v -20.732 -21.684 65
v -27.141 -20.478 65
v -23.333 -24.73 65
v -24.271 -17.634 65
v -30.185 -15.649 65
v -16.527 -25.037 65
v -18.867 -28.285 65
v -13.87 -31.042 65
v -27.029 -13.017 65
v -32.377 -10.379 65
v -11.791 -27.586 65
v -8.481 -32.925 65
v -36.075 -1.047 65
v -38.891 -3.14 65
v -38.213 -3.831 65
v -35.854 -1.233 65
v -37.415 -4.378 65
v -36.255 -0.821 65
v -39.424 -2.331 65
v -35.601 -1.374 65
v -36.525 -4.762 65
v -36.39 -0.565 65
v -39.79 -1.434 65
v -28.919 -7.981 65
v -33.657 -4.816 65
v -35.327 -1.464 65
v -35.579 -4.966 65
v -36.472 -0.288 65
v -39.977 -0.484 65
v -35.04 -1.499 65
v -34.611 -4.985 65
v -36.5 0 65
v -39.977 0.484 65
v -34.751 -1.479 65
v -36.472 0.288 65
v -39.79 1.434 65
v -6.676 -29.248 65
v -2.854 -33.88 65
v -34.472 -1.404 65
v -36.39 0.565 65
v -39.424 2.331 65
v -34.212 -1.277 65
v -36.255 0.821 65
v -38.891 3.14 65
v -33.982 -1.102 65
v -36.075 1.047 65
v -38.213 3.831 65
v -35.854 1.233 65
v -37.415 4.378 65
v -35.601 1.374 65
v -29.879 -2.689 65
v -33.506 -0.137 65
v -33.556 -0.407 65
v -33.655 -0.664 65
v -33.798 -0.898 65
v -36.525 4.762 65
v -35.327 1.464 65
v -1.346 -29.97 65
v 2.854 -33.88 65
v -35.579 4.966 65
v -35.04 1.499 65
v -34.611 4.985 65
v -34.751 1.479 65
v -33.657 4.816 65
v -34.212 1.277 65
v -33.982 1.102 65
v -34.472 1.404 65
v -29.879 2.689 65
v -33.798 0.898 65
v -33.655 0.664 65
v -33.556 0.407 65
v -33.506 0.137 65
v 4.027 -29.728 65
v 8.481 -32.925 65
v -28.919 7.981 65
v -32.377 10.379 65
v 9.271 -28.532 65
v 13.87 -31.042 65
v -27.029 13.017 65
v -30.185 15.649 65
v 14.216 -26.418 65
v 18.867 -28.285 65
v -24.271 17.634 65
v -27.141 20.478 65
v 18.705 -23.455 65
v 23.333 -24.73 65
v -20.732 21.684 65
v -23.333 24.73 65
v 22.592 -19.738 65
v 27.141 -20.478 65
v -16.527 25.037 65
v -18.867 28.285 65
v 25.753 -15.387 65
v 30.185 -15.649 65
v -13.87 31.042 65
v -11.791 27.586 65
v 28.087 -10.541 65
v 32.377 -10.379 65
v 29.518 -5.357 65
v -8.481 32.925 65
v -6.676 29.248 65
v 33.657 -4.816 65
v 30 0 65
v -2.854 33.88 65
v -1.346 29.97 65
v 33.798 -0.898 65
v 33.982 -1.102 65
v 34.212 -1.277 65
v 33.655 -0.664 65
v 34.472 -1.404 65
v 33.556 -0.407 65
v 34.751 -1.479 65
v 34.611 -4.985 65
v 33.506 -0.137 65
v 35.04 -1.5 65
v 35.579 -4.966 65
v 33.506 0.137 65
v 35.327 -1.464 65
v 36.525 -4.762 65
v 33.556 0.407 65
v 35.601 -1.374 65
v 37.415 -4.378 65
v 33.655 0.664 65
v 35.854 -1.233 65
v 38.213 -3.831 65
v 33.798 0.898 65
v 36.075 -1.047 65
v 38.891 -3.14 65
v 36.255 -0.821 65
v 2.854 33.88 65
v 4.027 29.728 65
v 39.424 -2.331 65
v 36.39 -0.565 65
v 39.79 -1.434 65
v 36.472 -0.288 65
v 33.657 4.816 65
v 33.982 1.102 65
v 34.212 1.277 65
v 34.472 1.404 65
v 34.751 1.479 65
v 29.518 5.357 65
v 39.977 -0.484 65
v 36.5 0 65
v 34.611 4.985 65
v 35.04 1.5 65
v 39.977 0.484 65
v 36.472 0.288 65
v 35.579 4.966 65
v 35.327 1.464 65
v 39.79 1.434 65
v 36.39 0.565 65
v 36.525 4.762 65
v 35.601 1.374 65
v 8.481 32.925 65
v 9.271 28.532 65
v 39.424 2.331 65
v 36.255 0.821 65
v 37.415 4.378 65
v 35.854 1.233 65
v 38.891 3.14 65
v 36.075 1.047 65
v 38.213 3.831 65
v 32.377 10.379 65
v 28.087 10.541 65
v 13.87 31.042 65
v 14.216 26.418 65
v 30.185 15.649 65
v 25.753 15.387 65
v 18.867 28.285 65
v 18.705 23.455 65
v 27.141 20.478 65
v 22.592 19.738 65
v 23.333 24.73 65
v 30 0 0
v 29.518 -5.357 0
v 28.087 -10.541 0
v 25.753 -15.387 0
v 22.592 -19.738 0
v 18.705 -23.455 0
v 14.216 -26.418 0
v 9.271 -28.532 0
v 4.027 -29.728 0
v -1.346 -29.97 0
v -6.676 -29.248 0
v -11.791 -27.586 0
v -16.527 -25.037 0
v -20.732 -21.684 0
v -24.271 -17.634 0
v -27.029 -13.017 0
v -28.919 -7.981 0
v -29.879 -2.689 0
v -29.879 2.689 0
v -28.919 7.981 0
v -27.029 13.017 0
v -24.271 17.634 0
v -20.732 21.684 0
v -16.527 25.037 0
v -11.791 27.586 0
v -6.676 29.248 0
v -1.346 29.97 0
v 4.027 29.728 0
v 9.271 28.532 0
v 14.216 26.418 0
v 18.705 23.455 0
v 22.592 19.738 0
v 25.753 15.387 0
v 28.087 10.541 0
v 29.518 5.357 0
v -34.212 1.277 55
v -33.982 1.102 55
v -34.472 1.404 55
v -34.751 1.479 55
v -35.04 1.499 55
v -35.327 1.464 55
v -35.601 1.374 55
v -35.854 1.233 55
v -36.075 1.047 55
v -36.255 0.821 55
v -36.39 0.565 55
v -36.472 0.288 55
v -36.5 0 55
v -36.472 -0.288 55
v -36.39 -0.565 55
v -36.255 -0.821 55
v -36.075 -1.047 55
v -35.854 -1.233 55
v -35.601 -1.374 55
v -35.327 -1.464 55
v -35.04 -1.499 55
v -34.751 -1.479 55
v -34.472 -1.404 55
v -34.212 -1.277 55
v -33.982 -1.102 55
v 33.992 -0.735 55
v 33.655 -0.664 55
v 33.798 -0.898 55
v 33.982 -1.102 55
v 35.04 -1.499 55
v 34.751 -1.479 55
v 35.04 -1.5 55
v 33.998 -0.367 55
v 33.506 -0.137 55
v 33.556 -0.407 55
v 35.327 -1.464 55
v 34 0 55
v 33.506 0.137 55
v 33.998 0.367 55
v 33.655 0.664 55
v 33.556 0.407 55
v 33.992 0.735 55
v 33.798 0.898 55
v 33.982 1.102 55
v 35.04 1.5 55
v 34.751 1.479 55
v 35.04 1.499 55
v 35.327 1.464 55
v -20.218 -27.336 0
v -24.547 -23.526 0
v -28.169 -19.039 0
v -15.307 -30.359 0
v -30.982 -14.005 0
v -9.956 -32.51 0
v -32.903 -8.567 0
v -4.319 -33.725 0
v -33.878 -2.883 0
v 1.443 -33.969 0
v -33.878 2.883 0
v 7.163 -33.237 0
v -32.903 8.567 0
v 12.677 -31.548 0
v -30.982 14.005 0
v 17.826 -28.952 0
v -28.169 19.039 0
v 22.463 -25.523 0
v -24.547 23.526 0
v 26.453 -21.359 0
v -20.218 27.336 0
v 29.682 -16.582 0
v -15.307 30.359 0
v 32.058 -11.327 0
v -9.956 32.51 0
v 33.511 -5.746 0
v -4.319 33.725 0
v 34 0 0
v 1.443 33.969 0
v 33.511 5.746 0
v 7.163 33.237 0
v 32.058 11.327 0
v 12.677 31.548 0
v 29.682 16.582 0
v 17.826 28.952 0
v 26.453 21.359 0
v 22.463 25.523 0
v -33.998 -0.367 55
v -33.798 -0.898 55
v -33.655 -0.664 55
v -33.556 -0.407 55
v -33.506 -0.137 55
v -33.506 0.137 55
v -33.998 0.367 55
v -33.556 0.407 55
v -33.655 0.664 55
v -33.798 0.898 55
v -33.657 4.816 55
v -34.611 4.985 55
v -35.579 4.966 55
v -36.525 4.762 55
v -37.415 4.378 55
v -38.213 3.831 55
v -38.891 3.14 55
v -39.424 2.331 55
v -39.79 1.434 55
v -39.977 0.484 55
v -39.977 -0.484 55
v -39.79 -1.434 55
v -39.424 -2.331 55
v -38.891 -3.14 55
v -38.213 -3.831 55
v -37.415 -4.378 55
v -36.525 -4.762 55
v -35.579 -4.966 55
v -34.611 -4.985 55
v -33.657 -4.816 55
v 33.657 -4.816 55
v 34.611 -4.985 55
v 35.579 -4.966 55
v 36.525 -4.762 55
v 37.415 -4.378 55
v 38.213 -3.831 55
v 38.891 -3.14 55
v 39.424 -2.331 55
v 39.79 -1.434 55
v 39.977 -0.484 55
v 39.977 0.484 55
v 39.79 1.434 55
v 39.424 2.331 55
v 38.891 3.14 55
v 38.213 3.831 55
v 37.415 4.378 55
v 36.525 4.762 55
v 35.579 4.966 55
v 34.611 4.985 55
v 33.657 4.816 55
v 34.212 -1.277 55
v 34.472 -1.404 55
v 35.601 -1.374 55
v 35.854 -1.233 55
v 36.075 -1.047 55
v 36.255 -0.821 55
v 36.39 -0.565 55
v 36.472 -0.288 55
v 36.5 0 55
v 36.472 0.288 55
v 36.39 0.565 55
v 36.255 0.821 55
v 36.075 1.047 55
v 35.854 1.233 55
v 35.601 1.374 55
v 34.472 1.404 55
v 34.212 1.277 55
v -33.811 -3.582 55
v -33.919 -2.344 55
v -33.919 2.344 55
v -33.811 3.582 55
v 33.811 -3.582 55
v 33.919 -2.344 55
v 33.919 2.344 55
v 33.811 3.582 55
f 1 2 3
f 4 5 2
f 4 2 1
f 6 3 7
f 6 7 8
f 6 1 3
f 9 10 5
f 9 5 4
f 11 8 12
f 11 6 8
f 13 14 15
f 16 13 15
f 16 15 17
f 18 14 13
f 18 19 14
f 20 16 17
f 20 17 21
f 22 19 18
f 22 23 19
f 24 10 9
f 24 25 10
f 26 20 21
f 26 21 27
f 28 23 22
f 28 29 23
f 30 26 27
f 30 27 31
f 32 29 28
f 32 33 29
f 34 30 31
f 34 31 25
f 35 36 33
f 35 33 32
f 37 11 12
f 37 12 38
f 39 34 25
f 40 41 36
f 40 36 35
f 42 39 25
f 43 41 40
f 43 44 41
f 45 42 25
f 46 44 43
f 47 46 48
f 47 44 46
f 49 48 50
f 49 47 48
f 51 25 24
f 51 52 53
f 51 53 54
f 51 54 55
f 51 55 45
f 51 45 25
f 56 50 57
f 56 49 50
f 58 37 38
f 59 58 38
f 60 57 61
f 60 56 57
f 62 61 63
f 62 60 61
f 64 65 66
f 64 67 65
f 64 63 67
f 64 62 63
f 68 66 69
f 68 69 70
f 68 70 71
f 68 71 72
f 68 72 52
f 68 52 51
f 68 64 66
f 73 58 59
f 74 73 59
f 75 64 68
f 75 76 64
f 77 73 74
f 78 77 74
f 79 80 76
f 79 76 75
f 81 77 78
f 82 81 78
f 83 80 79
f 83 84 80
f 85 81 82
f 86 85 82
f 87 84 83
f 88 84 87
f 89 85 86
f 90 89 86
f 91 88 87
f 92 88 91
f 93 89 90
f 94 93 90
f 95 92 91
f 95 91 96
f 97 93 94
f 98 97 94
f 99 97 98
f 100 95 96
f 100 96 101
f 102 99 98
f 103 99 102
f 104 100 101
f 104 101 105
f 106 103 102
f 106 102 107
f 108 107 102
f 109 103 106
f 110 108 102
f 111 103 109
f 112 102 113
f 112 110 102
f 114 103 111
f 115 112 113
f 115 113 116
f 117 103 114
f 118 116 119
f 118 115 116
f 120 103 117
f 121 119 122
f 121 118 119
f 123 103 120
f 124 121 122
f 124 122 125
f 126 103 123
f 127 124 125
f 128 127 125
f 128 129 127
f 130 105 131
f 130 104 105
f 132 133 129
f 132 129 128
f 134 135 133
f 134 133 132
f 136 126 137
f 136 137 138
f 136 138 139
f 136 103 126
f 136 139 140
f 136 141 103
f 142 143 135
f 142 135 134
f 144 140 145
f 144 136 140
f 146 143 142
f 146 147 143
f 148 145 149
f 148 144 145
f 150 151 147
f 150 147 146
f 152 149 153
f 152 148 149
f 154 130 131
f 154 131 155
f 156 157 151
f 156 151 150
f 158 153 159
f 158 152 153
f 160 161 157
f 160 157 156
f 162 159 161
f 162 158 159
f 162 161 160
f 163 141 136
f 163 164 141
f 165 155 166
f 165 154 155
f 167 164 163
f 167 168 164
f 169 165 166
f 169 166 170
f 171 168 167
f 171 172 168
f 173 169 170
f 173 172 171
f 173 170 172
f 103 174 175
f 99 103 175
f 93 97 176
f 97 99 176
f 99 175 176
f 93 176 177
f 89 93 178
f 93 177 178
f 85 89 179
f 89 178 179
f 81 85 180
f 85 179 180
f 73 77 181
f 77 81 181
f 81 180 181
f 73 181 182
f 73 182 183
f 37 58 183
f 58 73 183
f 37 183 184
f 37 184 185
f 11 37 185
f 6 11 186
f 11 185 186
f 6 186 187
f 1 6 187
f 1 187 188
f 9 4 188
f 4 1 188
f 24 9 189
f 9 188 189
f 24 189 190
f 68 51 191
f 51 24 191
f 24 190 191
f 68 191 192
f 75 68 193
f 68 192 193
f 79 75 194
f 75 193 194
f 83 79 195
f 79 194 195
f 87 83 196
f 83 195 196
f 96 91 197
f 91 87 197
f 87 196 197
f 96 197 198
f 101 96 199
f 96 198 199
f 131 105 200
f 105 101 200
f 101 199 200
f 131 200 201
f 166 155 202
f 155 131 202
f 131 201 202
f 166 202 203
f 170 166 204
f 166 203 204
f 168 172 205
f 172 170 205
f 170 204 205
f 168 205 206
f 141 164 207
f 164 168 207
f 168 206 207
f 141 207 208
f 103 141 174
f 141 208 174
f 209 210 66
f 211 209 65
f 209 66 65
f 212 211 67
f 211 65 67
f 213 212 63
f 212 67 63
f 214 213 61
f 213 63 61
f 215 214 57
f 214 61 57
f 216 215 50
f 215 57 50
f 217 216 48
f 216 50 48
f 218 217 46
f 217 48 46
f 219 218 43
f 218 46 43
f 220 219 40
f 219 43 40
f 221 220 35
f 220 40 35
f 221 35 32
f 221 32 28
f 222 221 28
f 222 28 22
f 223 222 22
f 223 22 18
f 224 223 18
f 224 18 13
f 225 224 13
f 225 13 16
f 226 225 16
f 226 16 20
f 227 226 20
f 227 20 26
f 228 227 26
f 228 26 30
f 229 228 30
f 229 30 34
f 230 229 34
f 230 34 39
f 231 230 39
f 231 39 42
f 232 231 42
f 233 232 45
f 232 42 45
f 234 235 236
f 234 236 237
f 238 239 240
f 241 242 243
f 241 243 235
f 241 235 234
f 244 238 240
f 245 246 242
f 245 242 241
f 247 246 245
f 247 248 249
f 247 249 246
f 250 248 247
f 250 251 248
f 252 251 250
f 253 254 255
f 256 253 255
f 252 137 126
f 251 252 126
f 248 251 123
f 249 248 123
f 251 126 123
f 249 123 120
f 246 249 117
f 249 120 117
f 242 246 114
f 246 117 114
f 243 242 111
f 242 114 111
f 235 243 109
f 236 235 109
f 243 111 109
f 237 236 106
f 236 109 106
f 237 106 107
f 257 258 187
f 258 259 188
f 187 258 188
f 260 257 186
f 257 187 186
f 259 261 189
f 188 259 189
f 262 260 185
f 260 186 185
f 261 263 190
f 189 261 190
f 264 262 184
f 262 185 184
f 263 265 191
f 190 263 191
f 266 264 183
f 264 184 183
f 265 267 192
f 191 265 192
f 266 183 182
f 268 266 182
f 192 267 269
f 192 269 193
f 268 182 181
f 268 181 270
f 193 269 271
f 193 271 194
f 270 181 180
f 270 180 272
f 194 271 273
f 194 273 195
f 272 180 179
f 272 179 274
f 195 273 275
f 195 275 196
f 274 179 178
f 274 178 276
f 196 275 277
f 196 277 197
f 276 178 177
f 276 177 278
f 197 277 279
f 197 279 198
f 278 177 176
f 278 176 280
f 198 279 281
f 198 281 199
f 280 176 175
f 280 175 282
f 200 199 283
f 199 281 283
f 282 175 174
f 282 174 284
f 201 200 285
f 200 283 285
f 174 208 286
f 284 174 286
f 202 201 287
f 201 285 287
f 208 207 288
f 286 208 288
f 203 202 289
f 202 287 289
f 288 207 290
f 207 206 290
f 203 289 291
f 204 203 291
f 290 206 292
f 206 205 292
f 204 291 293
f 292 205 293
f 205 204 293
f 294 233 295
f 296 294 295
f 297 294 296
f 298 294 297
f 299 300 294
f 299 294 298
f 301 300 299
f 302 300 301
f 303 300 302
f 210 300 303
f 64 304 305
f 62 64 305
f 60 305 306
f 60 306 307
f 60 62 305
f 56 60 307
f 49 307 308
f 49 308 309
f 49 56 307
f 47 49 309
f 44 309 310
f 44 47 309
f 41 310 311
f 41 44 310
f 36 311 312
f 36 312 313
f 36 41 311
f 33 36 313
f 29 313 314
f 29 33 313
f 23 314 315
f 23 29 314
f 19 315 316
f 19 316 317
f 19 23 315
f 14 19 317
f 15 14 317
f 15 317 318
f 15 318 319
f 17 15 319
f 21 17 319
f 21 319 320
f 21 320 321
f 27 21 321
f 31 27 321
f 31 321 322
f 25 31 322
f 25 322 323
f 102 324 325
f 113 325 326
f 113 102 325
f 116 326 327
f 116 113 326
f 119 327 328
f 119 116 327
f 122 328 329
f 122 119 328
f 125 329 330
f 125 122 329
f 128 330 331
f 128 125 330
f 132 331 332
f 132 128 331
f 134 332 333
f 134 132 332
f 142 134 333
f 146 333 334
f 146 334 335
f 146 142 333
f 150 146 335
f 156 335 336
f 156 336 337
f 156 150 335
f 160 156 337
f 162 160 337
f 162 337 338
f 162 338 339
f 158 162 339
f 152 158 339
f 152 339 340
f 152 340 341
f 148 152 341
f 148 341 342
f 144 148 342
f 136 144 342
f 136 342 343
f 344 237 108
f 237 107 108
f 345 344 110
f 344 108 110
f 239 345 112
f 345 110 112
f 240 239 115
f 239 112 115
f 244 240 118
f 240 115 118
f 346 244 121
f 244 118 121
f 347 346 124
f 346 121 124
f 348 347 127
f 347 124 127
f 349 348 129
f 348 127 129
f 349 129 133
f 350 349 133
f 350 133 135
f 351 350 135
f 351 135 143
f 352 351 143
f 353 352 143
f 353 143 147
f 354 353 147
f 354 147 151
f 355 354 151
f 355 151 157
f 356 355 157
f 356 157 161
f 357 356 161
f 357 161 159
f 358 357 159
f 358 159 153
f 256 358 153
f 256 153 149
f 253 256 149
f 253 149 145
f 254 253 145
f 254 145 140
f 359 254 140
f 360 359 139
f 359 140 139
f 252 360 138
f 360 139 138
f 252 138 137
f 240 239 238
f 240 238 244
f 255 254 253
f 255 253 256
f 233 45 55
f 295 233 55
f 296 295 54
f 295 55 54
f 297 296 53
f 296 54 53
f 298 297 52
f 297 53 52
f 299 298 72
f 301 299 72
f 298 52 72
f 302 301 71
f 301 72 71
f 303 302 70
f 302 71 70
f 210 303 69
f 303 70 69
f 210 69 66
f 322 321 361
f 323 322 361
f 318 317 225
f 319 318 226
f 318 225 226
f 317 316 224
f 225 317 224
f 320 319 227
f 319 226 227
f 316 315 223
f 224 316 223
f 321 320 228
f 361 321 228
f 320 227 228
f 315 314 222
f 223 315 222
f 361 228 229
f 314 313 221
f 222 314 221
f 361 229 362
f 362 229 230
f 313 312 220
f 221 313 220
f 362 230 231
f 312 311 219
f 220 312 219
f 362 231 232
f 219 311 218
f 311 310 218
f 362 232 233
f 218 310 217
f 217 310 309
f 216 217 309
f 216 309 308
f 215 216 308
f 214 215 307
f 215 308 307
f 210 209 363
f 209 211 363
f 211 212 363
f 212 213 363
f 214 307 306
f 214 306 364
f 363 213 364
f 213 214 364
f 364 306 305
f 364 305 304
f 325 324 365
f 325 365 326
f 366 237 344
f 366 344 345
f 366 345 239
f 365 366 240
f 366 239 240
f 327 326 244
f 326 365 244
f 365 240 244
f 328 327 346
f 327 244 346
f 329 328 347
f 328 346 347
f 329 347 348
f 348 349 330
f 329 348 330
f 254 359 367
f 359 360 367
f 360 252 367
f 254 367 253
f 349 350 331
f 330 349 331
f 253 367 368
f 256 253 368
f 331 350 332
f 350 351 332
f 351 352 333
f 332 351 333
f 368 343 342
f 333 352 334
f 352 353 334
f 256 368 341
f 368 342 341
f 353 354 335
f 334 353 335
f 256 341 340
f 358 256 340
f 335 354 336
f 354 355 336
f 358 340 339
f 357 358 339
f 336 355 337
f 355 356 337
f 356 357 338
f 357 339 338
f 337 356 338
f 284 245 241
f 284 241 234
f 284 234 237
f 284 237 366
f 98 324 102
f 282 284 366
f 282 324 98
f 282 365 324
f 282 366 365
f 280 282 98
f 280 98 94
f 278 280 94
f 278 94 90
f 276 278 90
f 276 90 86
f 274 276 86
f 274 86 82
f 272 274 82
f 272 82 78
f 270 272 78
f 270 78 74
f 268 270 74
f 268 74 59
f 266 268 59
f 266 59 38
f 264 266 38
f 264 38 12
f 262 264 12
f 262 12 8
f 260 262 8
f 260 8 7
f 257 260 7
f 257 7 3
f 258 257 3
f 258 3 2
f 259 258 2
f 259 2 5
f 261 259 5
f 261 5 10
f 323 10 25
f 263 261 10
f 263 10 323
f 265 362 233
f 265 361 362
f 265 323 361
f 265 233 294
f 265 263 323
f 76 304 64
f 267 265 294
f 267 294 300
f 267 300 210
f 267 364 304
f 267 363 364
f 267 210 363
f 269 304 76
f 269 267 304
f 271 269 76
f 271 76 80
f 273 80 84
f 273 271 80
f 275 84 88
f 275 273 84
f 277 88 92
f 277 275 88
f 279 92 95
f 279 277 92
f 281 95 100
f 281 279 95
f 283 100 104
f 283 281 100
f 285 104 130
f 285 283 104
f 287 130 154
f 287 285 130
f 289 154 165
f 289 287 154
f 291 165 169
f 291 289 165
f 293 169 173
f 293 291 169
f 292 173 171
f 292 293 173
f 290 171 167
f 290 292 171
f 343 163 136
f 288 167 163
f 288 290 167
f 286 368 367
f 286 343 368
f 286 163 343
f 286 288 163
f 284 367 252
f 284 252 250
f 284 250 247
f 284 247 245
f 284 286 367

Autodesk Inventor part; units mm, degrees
ref_plane "YZ Plane" through (0, 0, 0) normal (1, 0, 0) x (0, 1, 0)
ref_plane "XZ Plane" through (0, 0, 0) normal (0, 1, 0) x (-1, 0, 0)
ref_plane "XY Plane" through (0, 0, 0) normal (0, 0, 1) x (1, 0, 0)
sketch "Szkic1" plane through (0, 0, 0) normal (0, 0, 1) x (1, 0, 0)
  circle A0 centre (0, 0) radius 30
  circle A1 centre (0, 0) radius 34
  dimension "d0" = 60
  dimension "d1" = 4
extrude "Wyciągnięcie proste1" add sketch "Szkic1" along normal blind 65
sketch "Szkic2" plane through (0, 0, 65) normal (0, 0, 1) x (1, 0, 0)
  circle A0 centre (35, 0) radius 5
  circle A1 centre (0, 0) radius 34 projected
  circle A2 centre (0, 0) radius 30 projected
  circle A3 centre (35, 0) radius 1.5
  line L0 (0, 0) -> (0, -30)
  circle A4 centre (-35, 0) radius 5
  circle A5 centre (-35, 0) radius 1.5
  point P0 (33.9821, 1.1018)
  point P1 (33.9821, -1.1018)
  point P2 (33.6571, -4.8163)
  point P3 (33.6571, 4.8163)
  point P4 (-33.9821, -1.1018)
  point P5 (-33.9821, 1.1018)
  point P6 (-33.6571, 4.8163)
  point P7 (-33.6571, -4.8163)
  dimension "d5" = 10
  dimension "d6" = 3
  dimension "d9" = 70
extrude "Wyciągnięcie proste2" add sketch "Szkic2" against normal blind 10 contours A0 A1 A3 | A1 A5 A4 picked at (35.0063, -3.323) picked at (-35.0802, 3.3077)
sketch "Szkic3" plane through (0, 0, 65) normal (0, 0, 1) x (1, 0, 0)
  point P0 (0, 0)
sketch "Szkic4" plane through (0, 0, 65) normal (0, 0, 1) x (1, 0, 0)
  arc A0 (-33.9821, 1.1018) -> (-33.9821, -1.1018) centre (-35, 0) ccw projected
  circle A1 centre (-35, 0) radius 1.5
  arc A2 (33.9821, -1.1018) -> (33.9821, 1.1018) centre (35, 0) ccw projected
  circle A3 centre (35, 0) radius 1.5
  point P0 (0, 0)
  point P1 (33.9821, 1.1018)
  point P2 (33.9821, -1.1018)
  point P3 (-33.9821, -1.1018)
  point P4 (-33.9821, 1.1018)
extrude "Wyciągnięcie proste3" cut sketch "Szkic4" against normal blind 10
properties part number "osłonasilnik" material "Tworzywo sztuczne PET"
